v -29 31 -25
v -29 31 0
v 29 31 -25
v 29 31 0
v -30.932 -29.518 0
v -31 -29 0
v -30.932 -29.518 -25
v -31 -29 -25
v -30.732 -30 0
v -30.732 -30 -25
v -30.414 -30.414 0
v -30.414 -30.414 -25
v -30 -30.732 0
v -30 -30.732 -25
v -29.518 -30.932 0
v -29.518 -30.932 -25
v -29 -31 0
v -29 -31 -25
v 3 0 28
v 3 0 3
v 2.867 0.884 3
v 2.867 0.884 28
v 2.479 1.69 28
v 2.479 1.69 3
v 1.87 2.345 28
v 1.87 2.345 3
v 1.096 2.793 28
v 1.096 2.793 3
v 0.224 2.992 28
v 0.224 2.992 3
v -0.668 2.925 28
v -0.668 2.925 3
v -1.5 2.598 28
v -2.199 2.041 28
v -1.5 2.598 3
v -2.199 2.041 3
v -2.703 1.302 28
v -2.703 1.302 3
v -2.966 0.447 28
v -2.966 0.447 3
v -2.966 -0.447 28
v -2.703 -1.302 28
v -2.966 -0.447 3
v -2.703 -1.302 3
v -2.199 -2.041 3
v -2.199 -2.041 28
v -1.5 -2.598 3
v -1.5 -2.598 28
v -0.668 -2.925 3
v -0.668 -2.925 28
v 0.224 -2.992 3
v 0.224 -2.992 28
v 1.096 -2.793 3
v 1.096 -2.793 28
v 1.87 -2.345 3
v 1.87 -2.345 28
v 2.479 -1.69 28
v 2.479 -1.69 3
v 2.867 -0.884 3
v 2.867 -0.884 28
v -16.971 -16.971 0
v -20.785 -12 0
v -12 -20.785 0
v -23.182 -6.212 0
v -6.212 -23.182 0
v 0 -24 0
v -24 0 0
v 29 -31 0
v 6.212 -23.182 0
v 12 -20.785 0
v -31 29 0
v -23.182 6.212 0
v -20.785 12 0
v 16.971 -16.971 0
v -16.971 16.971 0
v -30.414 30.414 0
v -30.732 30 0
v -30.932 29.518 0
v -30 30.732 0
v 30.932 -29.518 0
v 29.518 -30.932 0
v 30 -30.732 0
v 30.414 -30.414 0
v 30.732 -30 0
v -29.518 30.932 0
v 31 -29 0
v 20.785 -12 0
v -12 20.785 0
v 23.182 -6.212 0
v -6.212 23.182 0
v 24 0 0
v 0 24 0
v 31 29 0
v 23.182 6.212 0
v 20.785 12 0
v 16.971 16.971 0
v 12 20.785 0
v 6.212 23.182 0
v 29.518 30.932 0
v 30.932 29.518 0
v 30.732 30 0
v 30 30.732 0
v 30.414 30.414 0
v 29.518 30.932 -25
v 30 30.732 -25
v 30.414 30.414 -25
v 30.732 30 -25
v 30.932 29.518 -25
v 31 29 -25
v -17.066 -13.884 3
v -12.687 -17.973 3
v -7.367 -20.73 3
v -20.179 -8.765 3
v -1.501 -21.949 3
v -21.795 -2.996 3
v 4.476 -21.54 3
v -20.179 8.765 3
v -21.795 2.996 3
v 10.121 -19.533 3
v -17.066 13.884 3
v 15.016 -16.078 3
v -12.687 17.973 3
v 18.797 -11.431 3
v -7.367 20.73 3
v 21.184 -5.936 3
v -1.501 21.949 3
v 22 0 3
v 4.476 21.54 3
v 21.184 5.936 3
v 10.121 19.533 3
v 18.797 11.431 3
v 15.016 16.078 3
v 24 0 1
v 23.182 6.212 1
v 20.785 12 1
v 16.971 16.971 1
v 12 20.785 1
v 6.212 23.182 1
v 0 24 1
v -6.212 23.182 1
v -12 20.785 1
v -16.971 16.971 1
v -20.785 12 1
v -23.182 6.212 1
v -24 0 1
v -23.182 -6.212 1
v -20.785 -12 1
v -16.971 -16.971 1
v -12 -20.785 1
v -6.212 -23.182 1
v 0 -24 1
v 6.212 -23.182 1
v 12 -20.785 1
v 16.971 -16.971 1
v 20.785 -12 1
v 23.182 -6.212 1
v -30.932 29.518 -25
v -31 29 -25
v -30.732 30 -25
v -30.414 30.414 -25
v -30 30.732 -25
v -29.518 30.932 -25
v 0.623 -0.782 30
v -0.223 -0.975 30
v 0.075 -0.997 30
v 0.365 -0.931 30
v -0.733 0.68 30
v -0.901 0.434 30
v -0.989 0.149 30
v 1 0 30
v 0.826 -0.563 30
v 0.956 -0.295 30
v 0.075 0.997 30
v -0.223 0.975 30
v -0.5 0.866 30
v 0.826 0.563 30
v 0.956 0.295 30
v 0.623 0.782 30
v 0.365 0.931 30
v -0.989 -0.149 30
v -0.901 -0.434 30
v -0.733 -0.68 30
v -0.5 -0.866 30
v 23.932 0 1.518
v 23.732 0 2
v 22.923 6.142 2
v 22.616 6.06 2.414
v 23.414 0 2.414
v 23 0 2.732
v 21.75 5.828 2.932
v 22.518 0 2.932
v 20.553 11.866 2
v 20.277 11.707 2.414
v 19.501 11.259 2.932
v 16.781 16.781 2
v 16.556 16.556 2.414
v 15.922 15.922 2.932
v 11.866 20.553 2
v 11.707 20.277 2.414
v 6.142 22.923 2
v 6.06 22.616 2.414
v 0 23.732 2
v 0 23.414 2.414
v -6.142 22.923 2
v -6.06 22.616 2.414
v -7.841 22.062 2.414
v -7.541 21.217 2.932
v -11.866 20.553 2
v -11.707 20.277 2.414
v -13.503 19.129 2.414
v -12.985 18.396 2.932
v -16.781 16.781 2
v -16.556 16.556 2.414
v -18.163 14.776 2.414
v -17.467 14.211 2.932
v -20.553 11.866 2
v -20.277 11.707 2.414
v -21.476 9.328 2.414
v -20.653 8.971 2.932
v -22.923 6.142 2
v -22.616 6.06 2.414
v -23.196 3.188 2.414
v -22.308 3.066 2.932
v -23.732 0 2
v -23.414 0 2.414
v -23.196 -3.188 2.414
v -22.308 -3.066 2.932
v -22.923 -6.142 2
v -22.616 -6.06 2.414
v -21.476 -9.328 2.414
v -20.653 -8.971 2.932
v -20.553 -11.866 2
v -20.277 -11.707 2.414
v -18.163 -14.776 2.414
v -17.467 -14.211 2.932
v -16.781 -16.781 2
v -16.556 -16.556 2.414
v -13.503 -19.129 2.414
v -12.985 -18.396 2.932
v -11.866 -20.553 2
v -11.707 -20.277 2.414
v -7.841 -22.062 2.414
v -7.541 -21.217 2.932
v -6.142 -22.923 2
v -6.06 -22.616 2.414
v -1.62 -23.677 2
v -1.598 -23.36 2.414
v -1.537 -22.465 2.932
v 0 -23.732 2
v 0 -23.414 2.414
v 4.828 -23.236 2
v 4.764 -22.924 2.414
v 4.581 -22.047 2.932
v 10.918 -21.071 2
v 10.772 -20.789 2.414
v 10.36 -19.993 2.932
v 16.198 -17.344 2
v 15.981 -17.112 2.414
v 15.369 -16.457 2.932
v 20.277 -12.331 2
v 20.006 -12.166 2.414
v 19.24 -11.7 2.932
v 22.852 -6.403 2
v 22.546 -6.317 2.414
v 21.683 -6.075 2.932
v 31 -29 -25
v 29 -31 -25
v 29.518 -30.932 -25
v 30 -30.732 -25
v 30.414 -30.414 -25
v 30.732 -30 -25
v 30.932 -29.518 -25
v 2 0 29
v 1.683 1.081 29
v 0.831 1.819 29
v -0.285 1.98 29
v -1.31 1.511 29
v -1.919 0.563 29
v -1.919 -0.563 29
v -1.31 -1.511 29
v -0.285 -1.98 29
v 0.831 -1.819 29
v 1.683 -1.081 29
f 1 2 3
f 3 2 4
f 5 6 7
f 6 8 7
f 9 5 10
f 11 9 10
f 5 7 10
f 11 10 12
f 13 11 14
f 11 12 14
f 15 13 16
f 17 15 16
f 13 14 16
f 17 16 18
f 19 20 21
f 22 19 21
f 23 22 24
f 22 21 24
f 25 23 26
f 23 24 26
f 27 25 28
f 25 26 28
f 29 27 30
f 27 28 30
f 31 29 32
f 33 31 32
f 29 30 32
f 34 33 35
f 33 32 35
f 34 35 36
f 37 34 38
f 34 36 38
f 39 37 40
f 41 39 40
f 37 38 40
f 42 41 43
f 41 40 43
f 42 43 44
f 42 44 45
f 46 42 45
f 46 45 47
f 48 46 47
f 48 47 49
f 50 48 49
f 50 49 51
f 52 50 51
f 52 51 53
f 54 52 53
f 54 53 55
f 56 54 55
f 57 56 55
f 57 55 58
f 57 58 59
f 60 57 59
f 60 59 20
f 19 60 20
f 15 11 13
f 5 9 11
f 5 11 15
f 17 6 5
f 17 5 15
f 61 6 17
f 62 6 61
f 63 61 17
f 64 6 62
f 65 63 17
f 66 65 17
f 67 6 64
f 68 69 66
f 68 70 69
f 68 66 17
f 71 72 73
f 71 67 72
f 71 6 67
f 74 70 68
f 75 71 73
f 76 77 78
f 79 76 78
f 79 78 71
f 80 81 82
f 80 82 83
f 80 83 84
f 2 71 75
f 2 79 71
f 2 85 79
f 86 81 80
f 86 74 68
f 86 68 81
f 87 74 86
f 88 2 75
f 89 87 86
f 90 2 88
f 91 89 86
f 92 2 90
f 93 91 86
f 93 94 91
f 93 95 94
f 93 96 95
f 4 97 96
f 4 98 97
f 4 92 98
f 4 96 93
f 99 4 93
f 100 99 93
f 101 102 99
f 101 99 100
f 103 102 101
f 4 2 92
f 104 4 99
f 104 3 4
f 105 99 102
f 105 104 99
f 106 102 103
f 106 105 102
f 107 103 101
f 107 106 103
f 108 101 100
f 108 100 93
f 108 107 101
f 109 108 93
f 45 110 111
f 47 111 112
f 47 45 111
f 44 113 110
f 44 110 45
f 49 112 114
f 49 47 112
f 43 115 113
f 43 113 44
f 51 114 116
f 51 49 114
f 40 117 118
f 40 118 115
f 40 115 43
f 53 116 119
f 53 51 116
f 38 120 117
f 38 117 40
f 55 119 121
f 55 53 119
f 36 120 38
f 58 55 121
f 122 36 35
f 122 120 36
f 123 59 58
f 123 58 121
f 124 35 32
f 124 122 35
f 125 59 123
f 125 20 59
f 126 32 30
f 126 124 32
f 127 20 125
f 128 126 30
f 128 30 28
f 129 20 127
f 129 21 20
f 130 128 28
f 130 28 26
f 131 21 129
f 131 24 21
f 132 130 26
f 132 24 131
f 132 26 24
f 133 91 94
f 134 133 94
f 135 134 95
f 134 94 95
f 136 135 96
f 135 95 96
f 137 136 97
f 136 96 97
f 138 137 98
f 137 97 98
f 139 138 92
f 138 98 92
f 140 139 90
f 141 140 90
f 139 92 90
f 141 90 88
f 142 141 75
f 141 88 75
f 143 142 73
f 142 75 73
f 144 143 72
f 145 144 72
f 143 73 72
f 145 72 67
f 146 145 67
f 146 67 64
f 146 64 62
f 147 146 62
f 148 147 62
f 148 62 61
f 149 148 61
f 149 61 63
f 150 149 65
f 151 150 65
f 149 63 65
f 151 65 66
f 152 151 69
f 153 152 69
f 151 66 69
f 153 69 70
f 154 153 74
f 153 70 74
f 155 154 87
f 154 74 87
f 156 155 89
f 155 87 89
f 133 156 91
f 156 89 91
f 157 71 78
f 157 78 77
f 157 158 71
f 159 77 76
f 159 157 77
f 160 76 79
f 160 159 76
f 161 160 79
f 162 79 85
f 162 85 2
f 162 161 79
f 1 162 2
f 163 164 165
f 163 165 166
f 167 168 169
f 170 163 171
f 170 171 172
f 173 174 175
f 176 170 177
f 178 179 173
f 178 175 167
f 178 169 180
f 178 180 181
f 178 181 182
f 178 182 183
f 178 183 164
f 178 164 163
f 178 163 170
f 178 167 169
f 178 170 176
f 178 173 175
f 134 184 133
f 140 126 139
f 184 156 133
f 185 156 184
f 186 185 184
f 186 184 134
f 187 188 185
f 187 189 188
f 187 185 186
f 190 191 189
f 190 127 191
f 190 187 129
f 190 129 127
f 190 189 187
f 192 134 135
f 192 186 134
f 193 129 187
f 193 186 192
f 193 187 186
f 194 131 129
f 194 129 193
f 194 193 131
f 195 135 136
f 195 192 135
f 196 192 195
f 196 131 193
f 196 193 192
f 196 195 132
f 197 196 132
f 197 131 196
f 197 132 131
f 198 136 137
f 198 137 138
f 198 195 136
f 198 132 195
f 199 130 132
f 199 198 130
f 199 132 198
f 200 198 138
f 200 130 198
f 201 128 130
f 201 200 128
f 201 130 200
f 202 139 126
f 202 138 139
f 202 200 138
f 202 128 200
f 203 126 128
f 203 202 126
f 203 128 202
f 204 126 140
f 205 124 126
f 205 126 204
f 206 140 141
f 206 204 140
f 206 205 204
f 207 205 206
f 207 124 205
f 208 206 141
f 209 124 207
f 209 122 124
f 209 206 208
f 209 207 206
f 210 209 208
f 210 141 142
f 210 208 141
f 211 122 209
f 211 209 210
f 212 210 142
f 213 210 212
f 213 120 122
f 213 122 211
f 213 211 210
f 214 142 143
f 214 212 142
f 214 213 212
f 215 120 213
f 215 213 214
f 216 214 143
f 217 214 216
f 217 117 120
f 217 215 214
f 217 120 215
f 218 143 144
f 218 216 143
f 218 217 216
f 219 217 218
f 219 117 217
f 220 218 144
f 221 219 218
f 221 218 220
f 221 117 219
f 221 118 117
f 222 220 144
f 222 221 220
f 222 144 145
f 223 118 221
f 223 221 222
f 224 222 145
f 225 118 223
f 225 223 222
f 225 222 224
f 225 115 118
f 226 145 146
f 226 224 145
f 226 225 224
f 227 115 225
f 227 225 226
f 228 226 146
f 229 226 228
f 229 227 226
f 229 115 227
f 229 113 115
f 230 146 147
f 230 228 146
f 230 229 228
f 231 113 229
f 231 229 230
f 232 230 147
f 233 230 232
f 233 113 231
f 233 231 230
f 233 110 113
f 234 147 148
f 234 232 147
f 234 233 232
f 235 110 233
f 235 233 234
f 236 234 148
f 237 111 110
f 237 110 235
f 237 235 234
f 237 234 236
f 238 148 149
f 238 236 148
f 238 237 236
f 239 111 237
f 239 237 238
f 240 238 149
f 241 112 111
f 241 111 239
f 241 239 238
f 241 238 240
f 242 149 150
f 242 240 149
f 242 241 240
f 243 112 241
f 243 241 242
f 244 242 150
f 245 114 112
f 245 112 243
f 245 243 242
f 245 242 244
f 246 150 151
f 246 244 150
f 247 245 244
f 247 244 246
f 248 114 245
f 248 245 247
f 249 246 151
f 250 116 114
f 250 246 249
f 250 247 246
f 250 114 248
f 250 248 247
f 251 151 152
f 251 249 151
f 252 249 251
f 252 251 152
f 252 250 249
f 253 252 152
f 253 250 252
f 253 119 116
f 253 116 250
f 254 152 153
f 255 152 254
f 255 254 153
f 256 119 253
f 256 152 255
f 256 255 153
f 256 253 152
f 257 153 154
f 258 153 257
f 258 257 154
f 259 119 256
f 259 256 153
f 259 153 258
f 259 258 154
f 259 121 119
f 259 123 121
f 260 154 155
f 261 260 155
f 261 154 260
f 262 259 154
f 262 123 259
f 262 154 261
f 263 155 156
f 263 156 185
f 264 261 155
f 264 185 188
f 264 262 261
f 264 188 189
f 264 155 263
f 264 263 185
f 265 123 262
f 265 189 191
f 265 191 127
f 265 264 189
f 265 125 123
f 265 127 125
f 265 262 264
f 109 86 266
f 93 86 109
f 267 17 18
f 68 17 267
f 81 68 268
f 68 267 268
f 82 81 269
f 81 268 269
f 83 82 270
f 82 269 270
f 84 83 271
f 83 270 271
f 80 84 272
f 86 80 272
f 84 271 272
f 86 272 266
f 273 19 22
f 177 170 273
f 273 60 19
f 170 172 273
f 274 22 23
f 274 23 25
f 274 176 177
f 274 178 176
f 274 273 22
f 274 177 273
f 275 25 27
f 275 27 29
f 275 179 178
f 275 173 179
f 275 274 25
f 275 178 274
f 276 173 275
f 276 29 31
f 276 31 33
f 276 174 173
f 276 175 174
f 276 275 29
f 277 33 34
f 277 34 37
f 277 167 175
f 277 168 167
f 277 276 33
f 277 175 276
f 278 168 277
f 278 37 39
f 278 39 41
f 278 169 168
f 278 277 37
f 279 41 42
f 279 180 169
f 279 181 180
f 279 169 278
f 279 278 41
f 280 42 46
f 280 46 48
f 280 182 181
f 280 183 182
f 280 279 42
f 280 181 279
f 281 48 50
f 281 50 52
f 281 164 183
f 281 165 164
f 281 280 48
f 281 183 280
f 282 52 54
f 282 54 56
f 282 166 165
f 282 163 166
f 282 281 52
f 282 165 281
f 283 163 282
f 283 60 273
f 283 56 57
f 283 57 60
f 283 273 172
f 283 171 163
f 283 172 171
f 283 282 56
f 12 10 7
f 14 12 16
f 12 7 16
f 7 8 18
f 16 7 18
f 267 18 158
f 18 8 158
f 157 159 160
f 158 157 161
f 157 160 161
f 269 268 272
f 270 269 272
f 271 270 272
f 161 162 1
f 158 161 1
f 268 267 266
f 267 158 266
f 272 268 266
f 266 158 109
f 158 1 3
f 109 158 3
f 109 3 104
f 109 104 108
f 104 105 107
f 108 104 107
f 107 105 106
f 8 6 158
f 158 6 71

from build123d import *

# Parameters (mm, degrees)
F0_R     = 24
F0_R_2   = 3
F1_DEPTH = 3
F2_DEPTH = 30
F0_W     = 62
F0_H     = 62
F3_DEPTH = 25
F4_R     = 2
F5_R     = 2
F6_SIZE  = 2


with BuildPart() as f1:
    # F0 (on Top) → F1 (new body)
    with BuildSketch(Plane.XY):
        Circle(F0_R)
        Circle(F0_R_2, mode=Mode.SUBTRACT)
        Circle(F0_R_2)
    extrude(amount=F1_DEPTH)

    # F0 (on Top) → F2 (join)
    with BuildSketch(Plane.XY):
        Circle(F0_R_2)
    extrude(amount=F2_DEPTH)

    # F0 (on Top) → F3 (join)
    with BuildSketch(Plane.XY):
        Rectangle(F0_W, F0_H)
        Circle(F0_R, mode=Mode.SUBTRACT)
        Circle(F0_R)
        Circle(F0_R_2, mode=Mode.SUBTRACT)
        Circle(F0_R_2)
    extrude(amount=-F3_DEPTH)

    # F4
    f4_edges = [f1.edges().sort_by_distance(p)[0] for p in [
        (31, -31, -12.5),
        (31, 31, -12.5),
        (-31, -31, -12.5),
        (-31, 31, -12.5),
    ]]
    fillet(f4_edges, radius=F4_R)

    # F5
    f5_edges = [f1.edges().sort_by_distance(p)[0] for p in [
        (-24, 0, 3),
    ]]
    fillet(f5_edges, radius=F5_R)

    # F6
    f6_edges = [f1.edges().sort_by_distance(p)[0] for p in [
        (-3, 0, 30),
    ]]
    chamfer(f6_edges, length=F6_SIZE)


solid = f1.part
